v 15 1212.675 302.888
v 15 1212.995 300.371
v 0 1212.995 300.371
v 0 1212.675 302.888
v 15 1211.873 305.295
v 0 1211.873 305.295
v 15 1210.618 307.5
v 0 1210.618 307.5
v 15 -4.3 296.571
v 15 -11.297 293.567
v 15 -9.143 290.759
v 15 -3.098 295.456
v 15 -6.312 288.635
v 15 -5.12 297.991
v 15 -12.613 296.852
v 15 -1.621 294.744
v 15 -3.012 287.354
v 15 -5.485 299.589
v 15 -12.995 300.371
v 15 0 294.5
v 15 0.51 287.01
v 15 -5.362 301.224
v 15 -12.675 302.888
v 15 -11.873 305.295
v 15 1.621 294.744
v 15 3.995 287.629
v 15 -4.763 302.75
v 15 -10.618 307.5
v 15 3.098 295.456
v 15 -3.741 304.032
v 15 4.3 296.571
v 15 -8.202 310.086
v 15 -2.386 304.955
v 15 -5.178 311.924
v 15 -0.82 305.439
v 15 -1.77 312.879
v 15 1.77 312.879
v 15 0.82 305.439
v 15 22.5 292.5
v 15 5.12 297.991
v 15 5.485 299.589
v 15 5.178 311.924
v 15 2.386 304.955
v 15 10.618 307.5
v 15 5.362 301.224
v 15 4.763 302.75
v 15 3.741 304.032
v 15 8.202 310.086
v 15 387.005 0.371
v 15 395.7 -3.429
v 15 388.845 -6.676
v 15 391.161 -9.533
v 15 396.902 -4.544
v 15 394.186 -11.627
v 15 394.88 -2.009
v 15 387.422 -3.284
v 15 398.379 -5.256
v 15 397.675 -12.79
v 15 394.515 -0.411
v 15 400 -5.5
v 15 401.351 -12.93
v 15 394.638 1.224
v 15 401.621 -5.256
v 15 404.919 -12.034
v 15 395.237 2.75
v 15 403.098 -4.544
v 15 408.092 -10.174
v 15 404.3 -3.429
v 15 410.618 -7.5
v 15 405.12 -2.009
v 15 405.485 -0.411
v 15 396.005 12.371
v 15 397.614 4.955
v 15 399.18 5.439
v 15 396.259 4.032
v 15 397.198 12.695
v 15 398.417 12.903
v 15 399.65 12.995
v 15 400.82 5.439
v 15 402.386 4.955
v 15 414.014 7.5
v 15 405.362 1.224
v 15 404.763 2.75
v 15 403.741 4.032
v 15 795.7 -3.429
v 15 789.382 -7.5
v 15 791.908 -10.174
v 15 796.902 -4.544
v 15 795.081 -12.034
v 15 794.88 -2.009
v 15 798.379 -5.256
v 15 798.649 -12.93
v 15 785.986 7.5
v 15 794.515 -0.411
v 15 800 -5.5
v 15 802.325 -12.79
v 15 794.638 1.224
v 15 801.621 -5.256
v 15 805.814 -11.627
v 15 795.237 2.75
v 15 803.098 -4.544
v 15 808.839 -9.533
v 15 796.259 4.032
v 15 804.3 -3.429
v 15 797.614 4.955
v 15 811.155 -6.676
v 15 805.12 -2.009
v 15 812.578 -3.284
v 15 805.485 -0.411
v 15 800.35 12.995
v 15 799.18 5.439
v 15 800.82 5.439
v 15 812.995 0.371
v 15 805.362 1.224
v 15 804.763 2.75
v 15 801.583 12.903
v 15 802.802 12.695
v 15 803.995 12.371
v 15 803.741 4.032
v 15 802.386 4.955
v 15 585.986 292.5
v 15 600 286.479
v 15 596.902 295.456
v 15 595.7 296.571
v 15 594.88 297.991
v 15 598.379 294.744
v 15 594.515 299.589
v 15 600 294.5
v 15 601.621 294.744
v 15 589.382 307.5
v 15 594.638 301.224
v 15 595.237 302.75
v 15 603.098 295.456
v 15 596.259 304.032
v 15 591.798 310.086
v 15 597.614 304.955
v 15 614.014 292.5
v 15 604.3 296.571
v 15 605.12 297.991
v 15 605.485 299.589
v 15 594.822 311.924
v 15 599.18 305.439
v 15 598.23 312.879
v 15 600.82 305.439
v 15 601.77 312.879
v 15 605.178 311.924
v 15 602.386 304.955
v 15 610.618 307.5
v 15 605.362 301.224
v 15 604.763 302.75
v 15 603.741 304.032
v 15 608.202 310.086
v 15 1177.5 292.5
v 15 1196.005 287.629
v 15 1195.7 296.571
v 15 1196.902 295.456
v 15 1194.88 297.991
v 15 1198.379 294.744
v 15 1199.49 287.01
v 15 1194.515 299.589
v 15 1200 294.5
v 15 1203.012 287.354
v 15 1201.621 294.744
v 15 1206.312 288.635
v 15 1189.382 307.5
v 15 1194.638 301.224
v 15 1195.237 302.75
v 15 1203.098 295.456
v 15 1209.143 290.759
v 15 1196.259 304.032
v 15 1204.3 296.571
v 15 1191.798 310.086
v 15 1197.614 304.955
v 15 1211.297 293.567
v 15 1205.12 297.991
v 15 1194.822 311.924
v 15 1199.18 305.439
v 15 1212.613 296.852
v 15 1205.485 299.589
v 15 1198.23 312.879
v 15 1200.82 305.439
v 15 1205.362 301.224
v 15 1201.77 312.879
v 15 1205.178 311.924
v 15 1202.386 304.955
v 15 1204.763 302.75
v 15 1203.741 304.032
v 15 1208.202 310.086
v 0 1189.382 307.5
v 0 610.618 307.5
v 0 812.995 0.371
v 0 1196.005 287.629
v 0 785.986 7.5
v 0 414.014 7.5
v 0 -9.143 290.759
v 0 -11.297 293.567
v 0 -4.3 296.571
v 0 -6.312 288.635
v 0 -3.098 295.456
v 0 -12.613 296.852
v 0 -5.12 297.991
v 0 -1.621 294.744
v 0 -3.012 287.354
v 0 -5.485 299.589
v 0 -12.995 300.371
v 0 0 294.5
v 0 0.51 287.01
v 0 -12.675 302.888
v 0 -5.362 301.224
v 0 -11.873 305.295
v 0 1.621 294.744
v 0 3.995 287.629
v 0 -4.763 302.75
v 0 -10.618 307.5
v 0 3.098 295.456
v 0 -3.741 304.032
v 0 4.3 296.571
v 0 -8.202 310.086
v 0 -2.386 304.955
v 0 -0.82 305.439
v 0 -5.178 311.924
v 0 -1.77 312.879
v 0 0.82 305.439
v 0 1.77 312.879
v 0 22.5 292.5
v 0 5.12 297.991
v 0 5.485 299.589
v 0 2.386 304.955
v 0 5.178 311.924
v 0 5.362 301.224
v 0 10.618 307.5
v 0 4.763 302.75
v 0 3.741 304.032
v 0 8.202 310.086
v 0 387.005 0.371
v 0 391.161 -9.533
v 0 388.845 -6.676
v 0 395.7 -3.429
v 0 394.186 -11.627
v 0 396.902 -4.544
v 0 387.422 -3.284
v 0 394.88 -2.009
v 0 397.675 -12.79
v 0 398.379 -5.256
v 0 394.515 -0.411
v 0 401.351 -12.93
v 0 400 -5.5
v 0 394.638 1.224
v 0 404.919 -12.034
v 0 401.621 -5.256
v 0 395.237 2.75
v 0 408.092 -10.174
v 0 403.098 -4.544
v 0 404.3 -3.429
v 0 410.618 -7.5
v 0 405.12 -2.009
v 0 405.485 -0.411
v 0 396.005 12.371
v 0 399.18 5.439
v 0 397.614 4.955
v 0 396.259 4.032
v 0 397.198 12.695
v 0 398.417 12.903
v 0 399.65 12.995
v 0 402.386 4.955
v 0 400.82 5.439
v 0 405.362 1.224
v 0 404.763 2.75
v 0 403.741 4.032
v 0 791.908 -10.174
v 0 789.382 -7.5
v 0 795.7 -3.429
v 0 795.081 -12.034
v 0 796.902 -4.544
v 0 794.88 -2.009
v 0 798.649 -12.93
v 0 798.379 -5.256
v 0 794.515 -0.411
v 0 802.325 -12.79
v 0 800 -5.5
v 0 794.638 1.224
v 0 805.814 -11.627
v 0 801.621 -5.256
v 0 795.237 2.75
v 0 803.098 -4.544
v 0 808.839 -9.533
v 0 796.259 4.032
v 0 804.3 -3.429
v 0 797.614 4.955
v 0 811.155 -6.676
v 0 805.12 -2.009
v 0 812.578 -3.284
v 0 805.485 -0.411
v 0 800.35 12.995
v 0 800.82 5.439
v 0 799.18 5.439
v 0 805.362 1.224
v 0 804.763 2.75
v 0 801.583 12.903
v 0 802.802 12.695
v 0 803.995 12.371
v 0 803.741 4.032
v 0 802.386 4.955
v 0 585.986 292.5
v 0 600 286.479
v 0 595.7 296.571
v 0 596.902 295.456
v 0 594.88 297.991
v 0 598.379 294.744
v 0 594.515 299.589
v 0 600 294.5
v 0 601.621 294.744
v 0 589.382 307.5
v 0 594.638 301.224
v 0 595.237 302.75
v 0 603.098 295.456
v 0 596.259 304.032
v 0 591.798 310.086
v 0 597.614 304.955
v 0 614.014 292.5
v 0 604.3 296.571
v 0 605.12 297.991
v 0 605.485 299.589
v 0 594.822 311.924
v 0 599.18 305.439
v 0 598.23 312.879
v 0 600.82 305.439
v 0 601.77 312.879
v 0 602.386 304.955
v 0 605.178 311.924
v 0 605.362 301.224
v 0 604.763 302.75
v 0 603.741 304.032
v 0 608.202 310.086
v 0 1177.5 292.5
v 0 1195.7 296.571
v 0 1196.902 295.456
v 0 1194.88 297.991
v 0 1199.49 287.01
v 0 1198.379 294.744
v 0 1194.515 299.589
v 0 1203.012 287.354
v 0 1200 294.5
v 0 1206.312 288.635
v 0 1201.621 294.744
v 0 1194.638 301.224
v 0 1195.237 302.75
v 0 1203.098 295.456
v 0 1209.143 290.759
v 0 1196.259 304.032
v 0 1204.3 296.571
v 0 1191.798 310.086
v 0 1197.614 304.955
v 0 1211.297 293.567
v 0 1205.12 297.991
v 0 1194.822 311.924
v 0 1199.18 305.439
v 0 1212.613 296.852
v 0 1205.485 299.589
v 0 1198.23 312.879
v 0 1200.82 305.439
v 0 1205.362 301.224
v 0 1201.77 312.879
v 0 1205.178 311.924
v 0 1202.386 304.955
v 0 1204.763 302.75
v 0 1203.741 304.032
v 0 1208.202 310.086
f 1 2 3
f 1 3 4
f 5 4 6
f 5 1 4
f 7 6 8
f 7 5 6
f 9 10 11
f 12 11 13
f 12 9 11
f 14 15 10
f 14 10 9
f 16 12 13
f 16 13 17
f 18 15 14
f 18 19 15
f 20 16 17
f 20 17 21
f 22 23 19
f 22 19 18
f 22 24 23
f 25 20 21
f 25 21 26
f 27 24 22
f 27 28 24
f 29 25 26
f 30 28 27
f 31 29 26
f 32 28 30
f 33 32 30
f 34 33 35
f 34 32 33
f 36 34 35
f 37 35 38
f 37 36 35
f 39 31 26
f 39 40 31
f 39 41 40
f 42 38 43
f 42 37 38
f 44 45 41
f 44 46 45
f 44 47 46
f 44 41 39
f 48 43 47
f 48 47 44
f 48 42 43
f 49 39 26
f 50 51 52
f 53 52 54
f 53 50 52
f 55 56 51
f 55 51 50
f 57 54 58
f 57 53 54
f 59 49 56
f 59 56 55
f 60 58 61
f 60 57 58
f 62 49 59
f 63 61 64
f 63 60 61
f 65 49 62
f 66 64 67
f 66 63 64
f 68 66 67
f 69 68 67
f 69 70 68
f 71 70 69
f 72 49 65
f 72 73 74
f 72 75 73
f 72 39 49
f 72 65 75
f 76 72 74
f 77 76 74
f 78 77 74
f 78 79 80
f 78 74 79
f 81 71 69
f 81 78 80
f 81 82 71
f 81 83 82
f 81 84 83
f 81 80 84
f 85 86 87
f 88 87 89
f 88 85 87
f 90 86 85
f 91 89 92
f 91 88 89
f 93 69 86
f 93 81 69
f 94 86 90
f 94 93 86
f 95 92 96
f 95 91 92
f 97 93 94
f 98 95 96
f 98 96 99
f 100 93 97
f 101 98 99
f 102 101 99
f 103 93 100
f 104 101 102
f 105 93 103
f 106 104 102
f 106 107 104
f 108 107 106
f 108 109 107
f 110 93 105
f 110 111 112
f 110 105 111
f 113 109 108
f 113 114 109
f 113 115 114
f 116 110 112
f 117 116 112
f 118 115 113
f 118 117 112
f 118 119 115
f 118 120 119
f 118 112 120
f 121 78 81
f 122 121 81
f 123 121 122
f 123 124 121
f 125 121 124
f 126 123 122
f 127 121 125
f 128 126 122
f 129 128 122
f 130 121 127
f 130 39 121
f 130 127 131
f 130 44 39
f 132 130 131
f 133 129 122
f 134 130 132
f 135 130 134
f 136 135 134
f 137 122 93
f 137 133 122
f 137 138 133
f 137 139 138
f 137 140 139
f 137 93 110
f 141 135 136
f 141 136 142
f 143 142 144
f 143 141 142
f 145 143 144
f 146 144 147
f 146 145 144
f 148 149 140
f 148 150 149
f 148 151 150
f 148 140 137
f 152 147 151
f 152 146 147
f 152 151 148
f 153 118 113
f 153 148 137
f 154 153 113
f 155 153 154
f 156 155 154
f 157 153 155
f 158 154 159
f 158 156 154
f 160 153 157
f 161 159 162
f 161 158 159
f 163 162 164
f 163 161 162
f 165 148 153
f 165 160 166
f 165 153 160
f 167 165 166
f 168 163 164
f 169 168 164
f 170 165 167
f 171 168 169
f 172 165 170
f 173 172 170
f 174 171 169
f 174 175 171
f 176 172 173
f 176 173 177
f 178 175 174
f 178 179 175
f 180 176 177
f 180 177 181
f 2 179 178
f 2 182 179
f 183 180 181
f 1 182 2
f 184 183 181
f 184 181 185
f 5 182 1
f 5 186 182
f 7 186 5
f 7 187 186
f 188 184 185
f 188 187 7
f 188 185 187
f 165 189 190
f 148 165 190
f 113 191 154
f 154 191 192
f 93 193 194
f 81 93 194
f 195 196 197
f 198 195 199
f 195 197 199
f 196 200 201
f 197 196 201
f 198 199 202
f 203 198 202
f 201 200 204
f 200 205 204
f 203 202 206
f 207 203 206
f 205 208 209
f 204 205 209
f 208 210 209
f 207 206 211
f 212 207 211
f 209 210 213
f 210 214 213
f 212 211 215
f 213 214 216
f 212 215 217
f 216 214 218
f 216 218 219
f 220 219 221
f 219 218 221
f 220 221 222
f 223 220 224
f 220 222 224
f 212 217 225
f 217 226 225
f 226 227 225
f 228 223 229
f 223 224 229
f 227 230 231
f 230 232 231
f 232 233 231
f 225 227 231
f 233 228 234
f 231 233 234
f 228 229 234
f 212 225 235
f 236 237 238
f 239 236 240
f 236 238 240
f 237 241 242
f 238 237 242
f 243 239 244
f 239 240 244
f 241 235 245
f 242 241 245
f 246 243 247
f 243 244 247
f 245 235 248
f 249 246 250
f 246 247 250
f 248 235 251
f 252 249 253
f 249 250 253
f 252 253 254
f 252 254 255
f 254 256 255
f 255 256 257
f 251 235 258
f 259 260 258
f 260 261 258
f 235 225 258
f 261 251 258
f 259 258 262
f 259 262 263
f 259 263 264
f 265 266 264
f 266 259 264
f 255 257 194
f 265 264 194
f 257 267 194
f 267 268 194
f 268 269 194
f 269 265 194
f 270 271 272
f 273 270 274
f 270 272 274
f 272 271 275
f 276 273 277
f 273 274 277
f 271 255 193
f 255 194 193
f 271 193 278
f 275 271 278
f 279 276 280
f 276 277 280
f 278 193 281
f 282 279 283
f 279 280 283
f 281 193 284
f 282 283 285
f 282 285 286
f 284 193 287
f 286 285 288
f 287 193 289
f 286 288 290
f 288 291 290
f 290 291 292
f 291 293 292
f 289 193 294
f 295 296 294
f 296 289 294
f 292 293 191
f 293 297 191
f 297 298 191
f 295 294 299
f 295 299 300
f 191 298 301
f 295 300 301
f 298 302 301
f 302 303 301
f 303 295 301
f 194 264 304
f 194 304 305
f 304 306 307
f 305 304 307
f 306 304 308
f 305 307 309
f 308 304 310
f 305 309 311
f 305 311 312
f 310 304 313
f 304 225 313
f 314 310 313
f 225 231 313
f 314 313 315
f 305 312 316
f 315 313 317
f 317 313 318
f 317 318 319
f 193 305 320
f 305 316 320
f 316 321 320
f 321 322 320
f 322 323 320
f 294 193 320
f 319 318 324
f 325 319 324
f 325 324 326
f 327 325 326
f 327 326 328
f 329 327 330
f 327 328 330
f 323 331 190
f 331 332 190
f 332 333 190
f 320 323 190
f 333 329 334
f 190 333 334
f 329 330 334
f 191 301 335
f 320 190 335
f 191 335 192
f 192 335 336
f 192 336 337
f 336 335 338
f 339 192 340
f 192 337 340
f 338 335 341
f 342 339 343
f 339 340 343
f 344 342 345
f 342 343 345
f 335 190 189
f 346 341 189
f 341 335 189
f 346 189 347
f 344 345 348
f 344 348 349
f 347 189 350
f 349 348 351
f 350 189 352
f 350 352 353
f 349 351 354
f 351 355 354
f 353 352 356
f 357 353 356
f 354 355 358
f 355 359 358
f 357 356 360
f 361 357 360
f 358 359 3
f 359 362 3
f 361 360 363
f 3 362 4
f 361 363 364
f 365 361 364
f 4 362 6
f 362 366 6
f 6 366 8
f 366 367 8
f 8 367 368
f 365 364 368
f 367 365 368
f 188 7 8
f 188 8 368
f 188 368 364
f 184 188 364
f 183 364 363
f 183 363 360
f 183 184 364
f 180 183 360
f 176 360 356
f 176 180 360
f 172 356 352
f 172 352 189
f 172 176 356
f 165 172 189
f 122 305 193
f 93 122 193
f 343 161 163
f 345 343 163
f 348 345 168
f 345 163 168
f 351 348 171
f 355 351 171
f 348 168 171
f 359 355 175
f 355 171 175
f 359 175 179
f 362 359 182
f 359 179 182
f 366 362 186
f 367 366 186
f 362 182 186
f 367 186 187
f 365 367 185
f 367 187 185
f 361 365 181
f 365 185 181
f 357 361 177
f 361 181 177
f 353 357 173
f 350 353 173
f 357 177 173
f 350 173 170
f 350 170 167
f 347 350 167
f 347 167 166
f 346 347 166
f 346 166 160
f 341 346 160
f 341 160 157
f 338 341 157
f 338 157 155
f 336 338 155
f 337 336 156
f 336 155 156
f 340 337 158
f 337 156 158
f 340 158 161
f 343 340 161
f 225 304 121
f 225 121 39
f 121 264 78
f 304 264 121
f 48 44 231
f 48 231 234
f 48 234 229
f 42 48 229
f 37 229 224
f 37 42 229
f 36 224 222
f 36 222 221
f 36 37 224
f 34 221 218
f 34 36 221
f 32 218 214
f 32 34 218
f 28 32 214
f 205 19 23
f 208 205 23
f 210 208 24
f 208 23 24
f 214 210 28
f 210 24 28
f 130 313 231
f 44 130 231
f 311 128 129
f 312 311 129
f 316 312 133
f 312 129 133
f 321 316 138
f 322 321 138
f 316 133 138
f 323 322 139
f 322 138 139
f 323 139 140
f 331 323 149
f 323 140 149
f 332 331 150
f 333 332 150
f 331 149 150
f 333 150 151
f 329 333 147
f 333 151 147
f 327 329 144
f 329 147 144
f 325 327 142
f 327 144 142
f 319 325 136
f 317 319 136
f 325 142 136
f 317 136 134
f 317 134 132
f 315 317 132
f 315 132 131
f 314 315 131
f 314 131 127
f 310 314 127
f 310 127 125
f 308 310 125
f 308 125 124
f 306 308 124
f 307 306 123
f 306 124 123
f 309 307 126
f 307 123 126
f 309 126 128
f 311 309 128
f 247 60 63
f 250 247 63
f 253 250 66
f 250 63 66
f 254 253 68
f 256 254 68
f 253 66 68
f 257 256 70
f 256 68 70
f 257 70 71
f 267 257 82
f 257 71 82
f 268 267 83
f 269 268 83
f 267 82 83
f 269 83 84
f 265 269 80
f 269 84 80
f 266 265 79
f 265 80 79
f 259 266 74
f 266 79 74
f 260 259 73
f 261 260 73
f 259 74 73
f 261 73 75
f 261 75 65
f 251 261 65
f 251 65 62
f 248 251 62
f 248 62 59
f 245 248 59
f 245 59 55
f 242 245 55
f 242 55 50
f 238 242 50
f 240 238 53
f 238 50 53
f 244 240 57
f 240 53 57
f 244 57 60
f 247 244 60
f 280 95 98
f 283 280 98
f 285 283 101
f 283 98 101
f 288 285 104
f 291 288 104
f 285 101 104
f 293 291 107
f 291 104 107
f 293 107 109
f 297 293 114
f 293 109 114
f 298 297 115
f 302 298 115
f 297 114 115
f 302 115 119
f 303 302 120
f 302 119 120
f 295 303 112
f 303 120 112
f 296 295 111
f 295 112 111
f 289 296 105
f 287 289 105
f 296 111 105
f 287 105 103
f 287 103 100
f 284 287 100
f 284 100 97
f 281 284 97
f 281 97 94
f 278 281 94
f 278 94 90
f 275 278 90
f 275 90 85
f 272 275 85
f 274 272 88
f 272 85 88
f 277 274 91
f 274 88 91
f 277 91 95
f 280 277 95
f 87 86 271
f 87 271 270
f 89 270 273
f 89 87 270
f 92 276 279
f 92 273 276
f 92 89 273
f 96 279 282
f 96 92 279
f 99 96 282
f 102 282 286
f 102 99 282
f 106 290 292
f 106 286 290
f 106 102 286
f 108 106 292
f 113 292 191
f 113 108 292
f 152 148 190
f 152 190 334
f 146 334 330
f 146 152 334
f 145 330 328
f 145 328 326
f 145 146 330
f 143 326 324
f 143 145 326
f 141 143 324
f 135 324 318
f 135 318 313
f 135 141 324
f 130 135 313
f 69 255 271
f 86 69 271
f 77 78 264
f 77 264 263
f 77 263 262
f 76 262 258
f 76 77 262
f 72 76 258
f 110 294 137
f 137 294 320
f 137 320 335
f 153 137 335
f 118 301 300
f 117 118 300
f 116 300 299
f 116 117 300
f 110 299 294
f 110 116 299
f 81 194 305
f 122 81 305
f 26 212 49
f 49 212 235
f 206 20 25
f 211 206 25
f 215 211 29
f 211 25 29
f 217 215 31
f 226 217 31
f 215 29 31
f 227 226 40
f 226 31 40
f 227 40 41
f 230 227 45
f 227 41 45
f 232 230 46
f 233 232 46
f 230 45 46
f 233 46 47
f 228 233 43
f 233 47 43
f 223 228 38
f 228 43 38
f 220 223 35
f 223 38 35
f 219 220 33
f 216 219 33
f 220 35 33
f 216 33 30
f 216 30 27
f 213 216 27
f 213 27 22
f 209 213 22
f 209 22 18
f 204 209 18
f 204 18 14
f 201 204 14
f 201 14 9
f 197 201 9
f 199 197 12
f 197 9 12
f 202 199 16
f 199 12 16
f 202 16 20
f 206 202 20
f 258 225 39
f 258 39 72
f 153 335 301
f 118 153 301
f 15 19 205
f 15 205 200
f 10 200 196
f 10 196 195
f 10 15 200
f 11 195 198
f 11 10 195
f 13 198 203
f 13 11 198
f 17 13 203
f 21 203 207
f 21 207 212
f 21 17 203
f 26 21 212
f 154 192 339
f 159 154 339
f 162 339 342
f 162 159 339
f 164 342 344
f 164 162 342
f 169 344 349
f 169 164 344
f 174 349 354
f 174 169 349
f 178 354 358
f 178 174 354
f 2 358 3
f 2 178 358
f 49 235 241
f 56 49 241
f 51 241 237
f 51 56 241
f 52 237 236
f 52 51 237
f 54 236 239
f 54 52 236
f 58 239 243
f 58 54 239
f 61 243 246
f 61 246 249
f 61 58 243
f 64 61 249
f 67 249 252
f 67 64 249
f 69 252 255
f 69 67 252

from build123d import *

# Parameters (mm, degrees)
BOSS_EXTRUDE1_DEPTH = 15
SKETCH3_R           = 13
BOSS_EXTRUDE2_DEPTH = 15
CUT_EXTRUDE1_DEPTH  = 15
SKETCH5_R           = 5.5
CUT_EXTRUDE2_DEPTH  = 15


with BuildPart() as part:
    # Sketch2 → Boss-Extrude1 (new body)
    with BuildSketch(Plane.YZ):
        with BuildLine():
            Line((600, 307.5), (-22.5, 307.5))
            Line((-22.5, 307.5), (395.5, -6))
            ThreePointArc((395.5, -6), (397.628291755, -7.115124735), (400, -7.5))
            Line((400, -7.5), (800, -7.5))
            ThreePointArc((800, -7.5), (802.371708245, -7.115124735), (804.5, -6))
            Line((804.5, -6), (1222.5, 307.5))
            Line((1222.5, 307.5), (600, 307.5))
        make_face()
        Polygon((414.013878189, 7.5), (600, 286.479182717), (785.986121811, 7.5), align=None, mode=Mode.SUBTRACT)
        Polygon((801.842585459, 10.756939094), (614.013878189, 292.5), (1177.5, 292.5), align=None, mode=Mode.SUBTRACT)
        Polygon((585.986121811, 292.5), (22.5, 292.5), (398.157414541, 10.756939094), align=None, mode=Mode.SUBTRACT)
    extrude(amount=BOSS_EXTRUDE1_DEPTH)

    # Sketch3 → Boss-Extrude2 (add)
    with BuildSketch(Plane.YZ.offset(15)):
        with Locations((400, 0)):
            Circle(SKETCH3_R)
        with Locations((0, 300)):
            Circle(SKETCH3_R)
        with Locations((600, 300)):
            Circle(SKETCH3_R)
        with Locations((1200, 300)):
            Circle(SKETCH3_R)
        with Locations((800, 0)):
            Circle(SKETCH3_R)
    extrude(amount=-BOSS_EXTRUDE2_DEPTH)

    # Sketch4 → Cut-Extrude1 (cut)
    with BuildSketch(Plane.YZ.offset(15)):
        with BuildLine():
            Line((-10.618380291, 307.5), (-22.5, 307.5))
            Line((-22.5, 307.5), (-12.994704233, 300.371028174))
            ThreePointArc((-12.994704233, 300.371028174), (-12.332882875, 304.110960958), (-10.618380291, 307.5))
        make_face()
        with BuildLine():
            Line((1210.618380291, 307.5), (1222.5, 307.5))
            Line((1222.5, 307.5), (1212.994704233, 300.371028174))
            ThreePointArc((1212.994704233, 300.371028174), (1212.332882875, 304.110960958), (1210.618380291, 307.5))
        make_face()
    extrude(amount=-CUT_EXTRUDE1_DEPTH, mode=Mode.SUBTRACT)

    # Sketch5 → Cut-Extrude2 (cut)
    with BuildSketch(Plane.YZ.offset(15)):
        with Locations(Location((0, 300, 0), (0, 0, 270))):
            Circle(SKETCH5_R)
        with Locations(Location((600, 300, 0), (0, 0, 270))):
            Circle(SKETCH5_R)
        with Locations(Location((1200, 300, 0), (0, 0, 270))):
            Circle(SKETCH5_R)
        with Locations(Location((800, 0, 0), (0, 0, 270))):
            Circle(SKETCH5_R)
        with Locations(Location((400, 0, 0), (0, 0, 270))):
            Circle(SKETCH5_R)
    extrude(amount=-CUT_EXTRUDE2_DEPTH, mode=Mode.SUBTRACT)


solid = part.part
